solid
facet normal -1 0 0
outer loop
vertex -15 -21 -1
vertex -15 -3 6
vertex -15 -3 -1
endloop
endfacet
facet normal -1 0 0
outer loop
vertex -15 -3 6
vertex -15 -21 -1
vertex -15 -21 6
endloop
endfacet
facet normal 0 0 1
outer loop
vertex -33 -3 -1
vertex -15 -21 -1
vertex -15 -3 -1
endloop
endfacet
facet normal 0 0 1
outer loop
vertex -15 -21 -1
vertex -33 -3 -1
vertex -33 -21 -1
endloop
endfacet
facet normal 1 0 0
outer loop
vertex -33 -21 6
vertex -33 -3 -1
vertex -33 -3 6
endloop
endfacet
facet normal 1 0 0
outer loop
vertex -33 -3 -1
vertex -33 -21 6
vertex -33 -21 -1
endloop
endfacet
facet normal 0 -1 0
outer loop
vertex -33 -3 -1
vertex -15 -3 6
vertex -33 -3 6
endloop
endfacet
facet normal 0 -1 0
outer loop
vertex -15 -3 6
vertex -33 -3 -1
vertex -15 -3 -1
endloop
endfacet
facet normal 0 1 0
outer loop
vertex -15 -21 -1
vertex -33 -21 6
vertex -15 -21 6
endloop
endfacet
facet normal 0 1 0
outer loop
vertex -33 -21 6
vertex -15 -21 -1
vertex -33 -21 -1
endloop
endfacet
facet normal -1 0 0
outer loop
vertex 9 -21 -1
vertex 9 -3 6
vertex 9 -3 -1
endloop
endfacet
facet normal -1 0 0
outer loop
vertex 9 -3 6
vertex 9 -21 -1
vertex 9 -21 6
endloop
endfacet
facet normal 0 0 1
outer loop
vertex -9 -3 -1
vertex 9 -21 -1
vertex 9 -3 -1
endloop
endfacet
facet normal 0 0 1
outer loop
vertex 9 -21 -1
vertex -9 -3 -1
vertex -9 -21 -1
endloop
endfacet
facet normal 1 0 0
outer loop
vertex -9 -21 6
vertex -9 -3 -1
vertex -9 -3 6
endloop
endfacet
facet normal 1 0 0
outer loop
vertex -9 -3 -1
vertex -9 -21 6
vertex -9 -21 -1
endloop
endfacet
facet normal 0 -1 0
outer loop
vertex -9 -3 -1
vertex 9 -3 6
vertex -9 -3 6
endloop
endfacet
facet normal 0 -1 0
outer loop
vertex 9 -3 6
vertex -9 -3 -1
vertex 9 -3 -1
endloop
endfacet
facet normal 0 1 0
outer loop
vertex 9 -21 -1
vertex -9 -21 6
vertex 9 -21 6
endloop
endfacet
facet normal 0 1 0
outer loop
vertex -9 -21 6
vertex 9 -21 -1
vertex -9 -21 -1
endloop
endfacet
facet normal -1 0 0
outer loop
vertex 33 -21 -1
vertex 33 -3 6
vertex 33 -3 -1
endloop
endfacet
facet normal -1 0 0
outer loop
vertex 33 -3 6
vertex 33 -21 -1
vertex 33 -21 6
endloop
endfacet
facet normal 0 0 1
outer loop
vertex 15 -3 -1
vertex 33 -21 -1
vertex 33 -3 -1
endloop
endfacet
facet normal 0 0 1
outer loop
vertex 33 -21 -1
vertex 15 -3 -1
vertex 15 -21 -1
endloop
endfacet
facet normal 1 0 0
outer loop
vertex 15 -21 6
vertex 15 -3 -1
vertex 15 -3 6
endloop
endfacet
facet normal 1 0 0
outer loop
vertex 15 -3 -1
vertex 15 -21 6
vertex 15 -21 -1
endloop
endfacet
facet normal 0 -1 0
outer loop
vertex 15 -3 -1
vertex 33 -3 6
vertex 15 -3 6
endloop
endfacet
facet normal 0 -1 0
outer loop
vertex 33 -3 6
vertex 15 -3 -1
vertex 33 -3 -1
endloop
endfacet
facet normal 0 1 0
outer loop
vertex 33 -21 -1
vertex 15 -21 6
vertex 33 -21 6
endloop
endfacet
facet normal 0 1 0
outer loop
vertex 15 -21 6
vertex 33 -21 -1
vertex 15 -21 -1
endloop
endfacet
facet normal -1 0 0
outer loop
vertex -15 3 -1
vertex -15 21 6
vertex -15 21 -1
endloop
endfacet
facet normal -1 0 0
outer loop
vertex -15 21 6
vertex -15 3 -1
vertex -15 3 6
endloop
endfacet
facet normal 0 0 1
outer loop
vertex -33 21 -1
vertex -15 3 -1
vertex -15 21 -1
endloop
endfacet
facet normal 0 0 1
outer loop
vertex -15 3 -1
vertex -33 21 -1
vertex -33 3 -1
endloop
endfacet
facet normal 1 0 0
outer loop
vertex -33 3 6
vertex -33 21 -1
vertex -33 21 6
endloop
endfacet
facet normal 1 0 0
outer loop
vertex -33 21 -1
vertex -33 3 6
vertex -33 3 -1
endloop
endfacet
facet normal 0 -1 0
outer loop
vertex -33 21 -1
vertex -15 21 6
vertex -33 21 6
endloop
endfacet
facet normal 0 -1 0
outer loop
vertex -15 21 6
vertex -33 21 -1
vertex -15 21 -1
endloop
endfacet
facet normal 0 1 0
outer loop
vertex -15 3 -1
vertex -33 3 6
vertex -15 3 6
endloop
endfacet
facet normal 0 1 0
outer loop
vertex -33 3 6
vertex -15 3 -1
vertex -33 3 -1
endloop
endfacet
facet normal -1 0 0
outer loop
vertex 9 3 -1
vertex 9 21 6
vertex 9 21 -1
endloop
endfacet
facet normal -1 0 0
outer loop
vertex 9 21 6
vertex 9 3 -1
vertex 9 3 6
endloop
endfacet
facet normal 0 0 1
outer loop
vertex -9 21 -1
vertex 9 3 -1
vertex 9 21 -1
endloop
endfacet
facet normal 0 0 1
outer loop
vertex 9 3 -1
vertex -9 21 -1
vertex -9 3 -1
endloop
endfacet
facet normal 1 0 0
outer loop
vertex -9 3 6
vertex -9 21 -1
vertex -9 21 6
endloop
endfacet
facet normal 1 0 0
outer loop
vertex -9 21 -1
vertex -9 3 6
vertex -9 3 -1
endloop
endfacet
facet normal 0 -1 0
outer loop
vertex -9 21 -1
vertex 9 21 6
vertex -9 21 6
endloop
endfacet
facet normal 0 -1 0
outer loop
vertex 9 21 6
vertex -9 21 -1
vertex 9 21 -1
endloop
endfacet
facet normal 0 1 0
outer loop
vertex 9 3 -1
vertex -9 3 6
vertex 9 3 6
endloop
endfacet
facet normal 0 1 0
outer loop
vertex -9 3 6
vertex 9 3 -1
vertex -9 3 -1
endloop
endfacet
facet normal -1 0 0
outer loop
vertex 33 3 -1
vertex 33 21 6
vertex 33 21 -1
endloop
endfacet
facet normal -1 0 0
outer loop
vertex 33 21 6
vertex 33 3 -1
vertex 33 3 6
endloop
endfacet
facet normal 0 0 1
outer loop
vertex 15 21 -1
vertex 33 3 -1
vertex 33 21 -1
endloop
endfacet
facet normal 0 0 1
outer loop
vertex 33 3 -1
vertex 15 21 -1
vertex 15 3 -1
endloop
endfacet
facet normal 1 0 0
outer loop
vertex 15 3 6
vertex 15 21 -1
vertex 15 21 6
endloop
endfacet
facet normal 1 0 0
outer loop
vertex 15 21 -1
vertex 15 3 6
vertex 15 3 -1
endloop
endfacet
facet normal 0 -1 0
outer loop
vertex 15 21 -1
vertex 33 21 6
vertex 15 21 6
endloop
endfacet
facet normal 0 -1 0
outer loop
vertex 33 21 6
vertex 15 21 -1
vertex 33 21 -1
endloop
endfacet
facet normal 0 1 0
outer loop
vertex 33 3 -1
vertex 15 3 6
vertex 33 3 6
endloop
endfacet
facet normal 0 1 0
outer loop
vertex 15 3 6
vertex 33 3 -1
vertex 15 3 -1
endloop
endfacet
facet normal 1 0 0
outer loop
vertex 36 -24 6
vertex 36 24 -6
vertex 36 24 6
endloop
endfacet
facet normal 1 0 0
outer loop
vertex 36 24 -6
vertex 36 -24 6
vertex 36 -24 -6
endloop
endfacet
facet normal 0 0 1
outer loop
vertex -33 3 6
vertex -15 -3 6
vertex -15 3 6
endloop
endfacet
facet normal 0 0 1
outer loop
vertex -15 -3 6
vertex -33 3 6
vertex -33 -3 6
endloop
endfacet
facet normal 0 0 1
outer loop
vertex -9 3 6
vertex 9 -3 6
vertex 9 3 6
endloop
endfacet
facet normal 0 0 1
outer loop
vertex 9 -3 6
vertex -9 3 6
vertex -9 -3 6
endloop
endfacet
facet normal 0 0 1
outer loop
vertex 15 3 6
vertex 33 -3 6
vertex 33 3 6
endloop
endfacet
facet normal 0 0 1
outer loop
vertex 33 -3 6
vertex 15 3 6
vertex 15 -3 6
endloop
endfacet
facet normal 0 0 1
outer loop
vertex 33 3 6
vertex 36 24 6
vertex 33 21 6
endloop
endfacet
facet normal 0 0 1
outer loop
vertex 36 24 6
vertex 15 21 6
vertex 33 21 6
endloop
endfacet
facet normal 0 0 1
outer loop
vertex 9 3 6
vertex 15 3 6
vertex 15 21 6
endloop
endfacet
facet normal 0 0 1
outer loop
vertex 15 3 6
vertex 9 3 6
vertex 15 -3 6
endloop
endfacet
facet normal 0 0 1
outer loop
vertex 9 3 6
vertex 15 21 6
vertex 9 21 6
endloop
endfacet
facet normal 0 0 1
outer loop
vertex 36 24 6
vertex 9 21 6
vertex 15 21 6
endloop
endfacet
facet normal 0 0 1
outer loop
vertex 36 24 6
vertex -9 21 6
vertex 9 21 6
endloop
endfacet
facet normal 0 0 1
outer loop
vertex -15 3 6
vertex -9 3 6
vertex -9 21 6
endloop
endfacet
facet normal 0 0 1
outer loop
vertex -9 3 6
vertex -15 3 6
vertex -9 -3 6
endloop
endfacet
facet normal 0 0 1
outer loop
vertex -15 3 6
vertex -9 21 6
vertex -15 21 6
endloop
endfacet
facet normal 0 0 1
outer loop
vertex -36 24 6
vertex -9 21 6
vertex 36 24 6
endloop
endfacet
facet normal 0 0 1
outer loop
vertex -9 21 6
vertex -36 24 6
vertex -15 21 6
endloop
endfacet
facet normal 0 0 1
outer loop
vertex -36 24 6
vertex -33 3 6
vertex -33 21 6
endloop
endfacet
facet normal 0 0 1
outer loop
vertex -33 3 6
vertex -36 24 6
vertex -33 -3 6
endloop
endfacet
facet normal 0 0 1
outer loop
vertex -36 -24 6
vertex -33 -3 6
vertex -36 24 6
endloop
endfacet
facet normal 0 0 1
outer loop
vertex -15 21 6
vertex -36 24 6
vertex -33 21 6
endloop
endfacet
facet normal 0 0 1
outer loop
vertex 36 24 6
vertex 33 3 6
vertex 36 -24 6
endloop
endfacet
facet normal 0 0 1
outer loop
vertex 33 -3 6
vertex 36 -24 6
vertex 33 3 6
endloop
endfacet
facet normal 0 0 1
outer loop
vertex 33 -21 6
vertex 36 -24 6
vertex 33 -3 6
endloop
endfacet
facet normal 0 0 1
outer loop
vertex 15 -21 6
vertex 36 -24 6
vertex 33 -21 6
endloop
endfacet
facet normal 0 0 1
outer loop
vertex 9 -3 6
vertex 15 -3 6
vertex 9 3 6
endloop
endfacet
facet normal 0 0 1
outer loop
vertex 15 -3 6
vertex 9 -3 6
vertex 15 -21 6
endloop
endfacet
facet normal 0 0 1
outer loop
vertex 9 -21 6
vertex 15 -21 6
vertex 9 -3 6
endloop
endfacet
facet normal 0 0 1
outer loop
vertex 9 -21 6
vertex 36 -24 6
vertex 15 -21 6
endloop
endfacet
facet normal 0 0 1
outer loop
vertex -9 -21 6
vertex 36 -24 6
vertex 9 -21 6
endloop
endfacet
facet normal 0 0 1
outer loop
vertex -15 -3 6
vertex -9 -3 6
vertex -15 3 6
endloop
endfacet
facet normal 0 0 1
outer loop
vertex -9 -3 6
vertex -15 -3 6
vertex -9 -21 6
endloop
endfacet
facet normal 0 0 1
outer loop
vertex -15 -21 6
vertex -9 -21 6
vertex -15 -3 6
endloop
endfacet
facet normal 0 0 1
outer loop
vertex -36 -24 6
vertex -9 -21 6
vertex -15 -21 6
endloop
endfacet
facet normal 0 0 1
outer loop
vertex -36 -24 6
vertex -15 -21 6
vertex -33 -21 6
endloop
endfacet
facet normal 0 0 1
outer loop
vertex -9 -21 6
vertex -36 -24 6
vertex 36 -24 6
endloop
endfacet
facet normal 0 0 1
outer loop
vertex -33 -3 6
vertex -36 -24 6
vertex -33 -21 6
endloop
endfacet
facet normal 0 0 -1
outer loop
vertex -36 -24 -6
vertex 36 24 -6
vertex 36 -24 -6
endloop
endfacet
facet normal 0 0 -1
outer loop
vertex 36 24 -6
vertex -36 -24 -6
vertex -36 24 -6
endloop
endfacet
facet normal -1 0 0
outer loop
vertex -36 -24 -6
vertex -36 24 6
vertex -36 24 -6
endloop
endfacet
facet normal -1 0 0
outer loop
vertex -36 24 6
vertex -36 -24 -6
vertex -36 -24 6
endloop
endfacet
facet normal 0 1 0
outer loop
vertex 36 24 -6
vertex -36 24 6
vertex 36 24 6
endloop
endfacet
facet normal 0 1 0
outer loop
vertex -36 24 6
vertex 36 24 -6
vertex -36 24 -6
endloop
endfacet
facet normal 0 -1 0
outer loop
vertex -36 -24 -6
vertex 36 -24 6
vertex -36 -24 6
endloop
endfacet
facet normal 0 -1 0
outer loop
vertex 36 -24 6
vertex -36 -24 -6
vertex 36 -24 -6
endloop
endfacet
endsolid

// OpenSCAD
$fn = 32;

// ----------------------------------------------------------------------
// Pocket plate 72 x 48 x 12
// 2 x 3 pockets 18 mm square, 7 mm deep
// ----------------------------------------------------------------------

// --- parameters (mm) ---
thickness = 12;  // plate thickness
floor_t = 5;     // material left under each pocket
pocket = 18;     // pocket side length
pitch_x = 24;    // pocket pitch along X
pitch_y = 24;    // pocket pitch along Y
cols = 3;        // pockets per row
rows = 2;        // rows of pockets

// --- derived feature positions (mm) ---
depth = thickness - floor_t;        // = 7   pocket depth, down to the floor
span_x = (cols - 1) * pitch_x;      // = 48   distance between outer pockets
span_y = (rows - 1) * pitch_y;      // = 24   distance between outer pocket rows
origin_x = -span_x / 2;             // = -24   X of the first pocket
origin_y = -span_y / 2;             // = -12   Y of the first pocket
plate = [span_x + pocket + 6, span_y + pocket + 6, thickness];  // = [72, 48, 12]   overall size: pockets plus 3 mm of wall on each side
feature_centers = [
  [origin_x + 0 * pitch_x, origin_y + 0 * pitch_y],
  [origin_x + 1 * pitch_x, origin_y + 0 * pitch_y],
  [origin_x + 2 * pitch_x, origin_y + 0 * pitch_y],
  [origin_x + 0 * pitch_x, origin_y + 1 * pitch_y],
  [origin_x + 1 * pitch_x, origin_y + 1 * pitch_y],
  [origin_x + 2 * pitch_x, origin_y + 1 * pitch_y]
];   // pocket centres, used verbatim by the cutter loop

// plate outline, then one pocket per centre in feature_centers
difference() {
  cube(plate, center = true);
  for (centre = feature_centers)
    translate([centre[0] - pocket / 2, centre[1] - pocket / 2, plate[2] / 2 - depth])
      cube([pocket, pocket, depth + 1]);  // centred on the declared pocket centre
}
